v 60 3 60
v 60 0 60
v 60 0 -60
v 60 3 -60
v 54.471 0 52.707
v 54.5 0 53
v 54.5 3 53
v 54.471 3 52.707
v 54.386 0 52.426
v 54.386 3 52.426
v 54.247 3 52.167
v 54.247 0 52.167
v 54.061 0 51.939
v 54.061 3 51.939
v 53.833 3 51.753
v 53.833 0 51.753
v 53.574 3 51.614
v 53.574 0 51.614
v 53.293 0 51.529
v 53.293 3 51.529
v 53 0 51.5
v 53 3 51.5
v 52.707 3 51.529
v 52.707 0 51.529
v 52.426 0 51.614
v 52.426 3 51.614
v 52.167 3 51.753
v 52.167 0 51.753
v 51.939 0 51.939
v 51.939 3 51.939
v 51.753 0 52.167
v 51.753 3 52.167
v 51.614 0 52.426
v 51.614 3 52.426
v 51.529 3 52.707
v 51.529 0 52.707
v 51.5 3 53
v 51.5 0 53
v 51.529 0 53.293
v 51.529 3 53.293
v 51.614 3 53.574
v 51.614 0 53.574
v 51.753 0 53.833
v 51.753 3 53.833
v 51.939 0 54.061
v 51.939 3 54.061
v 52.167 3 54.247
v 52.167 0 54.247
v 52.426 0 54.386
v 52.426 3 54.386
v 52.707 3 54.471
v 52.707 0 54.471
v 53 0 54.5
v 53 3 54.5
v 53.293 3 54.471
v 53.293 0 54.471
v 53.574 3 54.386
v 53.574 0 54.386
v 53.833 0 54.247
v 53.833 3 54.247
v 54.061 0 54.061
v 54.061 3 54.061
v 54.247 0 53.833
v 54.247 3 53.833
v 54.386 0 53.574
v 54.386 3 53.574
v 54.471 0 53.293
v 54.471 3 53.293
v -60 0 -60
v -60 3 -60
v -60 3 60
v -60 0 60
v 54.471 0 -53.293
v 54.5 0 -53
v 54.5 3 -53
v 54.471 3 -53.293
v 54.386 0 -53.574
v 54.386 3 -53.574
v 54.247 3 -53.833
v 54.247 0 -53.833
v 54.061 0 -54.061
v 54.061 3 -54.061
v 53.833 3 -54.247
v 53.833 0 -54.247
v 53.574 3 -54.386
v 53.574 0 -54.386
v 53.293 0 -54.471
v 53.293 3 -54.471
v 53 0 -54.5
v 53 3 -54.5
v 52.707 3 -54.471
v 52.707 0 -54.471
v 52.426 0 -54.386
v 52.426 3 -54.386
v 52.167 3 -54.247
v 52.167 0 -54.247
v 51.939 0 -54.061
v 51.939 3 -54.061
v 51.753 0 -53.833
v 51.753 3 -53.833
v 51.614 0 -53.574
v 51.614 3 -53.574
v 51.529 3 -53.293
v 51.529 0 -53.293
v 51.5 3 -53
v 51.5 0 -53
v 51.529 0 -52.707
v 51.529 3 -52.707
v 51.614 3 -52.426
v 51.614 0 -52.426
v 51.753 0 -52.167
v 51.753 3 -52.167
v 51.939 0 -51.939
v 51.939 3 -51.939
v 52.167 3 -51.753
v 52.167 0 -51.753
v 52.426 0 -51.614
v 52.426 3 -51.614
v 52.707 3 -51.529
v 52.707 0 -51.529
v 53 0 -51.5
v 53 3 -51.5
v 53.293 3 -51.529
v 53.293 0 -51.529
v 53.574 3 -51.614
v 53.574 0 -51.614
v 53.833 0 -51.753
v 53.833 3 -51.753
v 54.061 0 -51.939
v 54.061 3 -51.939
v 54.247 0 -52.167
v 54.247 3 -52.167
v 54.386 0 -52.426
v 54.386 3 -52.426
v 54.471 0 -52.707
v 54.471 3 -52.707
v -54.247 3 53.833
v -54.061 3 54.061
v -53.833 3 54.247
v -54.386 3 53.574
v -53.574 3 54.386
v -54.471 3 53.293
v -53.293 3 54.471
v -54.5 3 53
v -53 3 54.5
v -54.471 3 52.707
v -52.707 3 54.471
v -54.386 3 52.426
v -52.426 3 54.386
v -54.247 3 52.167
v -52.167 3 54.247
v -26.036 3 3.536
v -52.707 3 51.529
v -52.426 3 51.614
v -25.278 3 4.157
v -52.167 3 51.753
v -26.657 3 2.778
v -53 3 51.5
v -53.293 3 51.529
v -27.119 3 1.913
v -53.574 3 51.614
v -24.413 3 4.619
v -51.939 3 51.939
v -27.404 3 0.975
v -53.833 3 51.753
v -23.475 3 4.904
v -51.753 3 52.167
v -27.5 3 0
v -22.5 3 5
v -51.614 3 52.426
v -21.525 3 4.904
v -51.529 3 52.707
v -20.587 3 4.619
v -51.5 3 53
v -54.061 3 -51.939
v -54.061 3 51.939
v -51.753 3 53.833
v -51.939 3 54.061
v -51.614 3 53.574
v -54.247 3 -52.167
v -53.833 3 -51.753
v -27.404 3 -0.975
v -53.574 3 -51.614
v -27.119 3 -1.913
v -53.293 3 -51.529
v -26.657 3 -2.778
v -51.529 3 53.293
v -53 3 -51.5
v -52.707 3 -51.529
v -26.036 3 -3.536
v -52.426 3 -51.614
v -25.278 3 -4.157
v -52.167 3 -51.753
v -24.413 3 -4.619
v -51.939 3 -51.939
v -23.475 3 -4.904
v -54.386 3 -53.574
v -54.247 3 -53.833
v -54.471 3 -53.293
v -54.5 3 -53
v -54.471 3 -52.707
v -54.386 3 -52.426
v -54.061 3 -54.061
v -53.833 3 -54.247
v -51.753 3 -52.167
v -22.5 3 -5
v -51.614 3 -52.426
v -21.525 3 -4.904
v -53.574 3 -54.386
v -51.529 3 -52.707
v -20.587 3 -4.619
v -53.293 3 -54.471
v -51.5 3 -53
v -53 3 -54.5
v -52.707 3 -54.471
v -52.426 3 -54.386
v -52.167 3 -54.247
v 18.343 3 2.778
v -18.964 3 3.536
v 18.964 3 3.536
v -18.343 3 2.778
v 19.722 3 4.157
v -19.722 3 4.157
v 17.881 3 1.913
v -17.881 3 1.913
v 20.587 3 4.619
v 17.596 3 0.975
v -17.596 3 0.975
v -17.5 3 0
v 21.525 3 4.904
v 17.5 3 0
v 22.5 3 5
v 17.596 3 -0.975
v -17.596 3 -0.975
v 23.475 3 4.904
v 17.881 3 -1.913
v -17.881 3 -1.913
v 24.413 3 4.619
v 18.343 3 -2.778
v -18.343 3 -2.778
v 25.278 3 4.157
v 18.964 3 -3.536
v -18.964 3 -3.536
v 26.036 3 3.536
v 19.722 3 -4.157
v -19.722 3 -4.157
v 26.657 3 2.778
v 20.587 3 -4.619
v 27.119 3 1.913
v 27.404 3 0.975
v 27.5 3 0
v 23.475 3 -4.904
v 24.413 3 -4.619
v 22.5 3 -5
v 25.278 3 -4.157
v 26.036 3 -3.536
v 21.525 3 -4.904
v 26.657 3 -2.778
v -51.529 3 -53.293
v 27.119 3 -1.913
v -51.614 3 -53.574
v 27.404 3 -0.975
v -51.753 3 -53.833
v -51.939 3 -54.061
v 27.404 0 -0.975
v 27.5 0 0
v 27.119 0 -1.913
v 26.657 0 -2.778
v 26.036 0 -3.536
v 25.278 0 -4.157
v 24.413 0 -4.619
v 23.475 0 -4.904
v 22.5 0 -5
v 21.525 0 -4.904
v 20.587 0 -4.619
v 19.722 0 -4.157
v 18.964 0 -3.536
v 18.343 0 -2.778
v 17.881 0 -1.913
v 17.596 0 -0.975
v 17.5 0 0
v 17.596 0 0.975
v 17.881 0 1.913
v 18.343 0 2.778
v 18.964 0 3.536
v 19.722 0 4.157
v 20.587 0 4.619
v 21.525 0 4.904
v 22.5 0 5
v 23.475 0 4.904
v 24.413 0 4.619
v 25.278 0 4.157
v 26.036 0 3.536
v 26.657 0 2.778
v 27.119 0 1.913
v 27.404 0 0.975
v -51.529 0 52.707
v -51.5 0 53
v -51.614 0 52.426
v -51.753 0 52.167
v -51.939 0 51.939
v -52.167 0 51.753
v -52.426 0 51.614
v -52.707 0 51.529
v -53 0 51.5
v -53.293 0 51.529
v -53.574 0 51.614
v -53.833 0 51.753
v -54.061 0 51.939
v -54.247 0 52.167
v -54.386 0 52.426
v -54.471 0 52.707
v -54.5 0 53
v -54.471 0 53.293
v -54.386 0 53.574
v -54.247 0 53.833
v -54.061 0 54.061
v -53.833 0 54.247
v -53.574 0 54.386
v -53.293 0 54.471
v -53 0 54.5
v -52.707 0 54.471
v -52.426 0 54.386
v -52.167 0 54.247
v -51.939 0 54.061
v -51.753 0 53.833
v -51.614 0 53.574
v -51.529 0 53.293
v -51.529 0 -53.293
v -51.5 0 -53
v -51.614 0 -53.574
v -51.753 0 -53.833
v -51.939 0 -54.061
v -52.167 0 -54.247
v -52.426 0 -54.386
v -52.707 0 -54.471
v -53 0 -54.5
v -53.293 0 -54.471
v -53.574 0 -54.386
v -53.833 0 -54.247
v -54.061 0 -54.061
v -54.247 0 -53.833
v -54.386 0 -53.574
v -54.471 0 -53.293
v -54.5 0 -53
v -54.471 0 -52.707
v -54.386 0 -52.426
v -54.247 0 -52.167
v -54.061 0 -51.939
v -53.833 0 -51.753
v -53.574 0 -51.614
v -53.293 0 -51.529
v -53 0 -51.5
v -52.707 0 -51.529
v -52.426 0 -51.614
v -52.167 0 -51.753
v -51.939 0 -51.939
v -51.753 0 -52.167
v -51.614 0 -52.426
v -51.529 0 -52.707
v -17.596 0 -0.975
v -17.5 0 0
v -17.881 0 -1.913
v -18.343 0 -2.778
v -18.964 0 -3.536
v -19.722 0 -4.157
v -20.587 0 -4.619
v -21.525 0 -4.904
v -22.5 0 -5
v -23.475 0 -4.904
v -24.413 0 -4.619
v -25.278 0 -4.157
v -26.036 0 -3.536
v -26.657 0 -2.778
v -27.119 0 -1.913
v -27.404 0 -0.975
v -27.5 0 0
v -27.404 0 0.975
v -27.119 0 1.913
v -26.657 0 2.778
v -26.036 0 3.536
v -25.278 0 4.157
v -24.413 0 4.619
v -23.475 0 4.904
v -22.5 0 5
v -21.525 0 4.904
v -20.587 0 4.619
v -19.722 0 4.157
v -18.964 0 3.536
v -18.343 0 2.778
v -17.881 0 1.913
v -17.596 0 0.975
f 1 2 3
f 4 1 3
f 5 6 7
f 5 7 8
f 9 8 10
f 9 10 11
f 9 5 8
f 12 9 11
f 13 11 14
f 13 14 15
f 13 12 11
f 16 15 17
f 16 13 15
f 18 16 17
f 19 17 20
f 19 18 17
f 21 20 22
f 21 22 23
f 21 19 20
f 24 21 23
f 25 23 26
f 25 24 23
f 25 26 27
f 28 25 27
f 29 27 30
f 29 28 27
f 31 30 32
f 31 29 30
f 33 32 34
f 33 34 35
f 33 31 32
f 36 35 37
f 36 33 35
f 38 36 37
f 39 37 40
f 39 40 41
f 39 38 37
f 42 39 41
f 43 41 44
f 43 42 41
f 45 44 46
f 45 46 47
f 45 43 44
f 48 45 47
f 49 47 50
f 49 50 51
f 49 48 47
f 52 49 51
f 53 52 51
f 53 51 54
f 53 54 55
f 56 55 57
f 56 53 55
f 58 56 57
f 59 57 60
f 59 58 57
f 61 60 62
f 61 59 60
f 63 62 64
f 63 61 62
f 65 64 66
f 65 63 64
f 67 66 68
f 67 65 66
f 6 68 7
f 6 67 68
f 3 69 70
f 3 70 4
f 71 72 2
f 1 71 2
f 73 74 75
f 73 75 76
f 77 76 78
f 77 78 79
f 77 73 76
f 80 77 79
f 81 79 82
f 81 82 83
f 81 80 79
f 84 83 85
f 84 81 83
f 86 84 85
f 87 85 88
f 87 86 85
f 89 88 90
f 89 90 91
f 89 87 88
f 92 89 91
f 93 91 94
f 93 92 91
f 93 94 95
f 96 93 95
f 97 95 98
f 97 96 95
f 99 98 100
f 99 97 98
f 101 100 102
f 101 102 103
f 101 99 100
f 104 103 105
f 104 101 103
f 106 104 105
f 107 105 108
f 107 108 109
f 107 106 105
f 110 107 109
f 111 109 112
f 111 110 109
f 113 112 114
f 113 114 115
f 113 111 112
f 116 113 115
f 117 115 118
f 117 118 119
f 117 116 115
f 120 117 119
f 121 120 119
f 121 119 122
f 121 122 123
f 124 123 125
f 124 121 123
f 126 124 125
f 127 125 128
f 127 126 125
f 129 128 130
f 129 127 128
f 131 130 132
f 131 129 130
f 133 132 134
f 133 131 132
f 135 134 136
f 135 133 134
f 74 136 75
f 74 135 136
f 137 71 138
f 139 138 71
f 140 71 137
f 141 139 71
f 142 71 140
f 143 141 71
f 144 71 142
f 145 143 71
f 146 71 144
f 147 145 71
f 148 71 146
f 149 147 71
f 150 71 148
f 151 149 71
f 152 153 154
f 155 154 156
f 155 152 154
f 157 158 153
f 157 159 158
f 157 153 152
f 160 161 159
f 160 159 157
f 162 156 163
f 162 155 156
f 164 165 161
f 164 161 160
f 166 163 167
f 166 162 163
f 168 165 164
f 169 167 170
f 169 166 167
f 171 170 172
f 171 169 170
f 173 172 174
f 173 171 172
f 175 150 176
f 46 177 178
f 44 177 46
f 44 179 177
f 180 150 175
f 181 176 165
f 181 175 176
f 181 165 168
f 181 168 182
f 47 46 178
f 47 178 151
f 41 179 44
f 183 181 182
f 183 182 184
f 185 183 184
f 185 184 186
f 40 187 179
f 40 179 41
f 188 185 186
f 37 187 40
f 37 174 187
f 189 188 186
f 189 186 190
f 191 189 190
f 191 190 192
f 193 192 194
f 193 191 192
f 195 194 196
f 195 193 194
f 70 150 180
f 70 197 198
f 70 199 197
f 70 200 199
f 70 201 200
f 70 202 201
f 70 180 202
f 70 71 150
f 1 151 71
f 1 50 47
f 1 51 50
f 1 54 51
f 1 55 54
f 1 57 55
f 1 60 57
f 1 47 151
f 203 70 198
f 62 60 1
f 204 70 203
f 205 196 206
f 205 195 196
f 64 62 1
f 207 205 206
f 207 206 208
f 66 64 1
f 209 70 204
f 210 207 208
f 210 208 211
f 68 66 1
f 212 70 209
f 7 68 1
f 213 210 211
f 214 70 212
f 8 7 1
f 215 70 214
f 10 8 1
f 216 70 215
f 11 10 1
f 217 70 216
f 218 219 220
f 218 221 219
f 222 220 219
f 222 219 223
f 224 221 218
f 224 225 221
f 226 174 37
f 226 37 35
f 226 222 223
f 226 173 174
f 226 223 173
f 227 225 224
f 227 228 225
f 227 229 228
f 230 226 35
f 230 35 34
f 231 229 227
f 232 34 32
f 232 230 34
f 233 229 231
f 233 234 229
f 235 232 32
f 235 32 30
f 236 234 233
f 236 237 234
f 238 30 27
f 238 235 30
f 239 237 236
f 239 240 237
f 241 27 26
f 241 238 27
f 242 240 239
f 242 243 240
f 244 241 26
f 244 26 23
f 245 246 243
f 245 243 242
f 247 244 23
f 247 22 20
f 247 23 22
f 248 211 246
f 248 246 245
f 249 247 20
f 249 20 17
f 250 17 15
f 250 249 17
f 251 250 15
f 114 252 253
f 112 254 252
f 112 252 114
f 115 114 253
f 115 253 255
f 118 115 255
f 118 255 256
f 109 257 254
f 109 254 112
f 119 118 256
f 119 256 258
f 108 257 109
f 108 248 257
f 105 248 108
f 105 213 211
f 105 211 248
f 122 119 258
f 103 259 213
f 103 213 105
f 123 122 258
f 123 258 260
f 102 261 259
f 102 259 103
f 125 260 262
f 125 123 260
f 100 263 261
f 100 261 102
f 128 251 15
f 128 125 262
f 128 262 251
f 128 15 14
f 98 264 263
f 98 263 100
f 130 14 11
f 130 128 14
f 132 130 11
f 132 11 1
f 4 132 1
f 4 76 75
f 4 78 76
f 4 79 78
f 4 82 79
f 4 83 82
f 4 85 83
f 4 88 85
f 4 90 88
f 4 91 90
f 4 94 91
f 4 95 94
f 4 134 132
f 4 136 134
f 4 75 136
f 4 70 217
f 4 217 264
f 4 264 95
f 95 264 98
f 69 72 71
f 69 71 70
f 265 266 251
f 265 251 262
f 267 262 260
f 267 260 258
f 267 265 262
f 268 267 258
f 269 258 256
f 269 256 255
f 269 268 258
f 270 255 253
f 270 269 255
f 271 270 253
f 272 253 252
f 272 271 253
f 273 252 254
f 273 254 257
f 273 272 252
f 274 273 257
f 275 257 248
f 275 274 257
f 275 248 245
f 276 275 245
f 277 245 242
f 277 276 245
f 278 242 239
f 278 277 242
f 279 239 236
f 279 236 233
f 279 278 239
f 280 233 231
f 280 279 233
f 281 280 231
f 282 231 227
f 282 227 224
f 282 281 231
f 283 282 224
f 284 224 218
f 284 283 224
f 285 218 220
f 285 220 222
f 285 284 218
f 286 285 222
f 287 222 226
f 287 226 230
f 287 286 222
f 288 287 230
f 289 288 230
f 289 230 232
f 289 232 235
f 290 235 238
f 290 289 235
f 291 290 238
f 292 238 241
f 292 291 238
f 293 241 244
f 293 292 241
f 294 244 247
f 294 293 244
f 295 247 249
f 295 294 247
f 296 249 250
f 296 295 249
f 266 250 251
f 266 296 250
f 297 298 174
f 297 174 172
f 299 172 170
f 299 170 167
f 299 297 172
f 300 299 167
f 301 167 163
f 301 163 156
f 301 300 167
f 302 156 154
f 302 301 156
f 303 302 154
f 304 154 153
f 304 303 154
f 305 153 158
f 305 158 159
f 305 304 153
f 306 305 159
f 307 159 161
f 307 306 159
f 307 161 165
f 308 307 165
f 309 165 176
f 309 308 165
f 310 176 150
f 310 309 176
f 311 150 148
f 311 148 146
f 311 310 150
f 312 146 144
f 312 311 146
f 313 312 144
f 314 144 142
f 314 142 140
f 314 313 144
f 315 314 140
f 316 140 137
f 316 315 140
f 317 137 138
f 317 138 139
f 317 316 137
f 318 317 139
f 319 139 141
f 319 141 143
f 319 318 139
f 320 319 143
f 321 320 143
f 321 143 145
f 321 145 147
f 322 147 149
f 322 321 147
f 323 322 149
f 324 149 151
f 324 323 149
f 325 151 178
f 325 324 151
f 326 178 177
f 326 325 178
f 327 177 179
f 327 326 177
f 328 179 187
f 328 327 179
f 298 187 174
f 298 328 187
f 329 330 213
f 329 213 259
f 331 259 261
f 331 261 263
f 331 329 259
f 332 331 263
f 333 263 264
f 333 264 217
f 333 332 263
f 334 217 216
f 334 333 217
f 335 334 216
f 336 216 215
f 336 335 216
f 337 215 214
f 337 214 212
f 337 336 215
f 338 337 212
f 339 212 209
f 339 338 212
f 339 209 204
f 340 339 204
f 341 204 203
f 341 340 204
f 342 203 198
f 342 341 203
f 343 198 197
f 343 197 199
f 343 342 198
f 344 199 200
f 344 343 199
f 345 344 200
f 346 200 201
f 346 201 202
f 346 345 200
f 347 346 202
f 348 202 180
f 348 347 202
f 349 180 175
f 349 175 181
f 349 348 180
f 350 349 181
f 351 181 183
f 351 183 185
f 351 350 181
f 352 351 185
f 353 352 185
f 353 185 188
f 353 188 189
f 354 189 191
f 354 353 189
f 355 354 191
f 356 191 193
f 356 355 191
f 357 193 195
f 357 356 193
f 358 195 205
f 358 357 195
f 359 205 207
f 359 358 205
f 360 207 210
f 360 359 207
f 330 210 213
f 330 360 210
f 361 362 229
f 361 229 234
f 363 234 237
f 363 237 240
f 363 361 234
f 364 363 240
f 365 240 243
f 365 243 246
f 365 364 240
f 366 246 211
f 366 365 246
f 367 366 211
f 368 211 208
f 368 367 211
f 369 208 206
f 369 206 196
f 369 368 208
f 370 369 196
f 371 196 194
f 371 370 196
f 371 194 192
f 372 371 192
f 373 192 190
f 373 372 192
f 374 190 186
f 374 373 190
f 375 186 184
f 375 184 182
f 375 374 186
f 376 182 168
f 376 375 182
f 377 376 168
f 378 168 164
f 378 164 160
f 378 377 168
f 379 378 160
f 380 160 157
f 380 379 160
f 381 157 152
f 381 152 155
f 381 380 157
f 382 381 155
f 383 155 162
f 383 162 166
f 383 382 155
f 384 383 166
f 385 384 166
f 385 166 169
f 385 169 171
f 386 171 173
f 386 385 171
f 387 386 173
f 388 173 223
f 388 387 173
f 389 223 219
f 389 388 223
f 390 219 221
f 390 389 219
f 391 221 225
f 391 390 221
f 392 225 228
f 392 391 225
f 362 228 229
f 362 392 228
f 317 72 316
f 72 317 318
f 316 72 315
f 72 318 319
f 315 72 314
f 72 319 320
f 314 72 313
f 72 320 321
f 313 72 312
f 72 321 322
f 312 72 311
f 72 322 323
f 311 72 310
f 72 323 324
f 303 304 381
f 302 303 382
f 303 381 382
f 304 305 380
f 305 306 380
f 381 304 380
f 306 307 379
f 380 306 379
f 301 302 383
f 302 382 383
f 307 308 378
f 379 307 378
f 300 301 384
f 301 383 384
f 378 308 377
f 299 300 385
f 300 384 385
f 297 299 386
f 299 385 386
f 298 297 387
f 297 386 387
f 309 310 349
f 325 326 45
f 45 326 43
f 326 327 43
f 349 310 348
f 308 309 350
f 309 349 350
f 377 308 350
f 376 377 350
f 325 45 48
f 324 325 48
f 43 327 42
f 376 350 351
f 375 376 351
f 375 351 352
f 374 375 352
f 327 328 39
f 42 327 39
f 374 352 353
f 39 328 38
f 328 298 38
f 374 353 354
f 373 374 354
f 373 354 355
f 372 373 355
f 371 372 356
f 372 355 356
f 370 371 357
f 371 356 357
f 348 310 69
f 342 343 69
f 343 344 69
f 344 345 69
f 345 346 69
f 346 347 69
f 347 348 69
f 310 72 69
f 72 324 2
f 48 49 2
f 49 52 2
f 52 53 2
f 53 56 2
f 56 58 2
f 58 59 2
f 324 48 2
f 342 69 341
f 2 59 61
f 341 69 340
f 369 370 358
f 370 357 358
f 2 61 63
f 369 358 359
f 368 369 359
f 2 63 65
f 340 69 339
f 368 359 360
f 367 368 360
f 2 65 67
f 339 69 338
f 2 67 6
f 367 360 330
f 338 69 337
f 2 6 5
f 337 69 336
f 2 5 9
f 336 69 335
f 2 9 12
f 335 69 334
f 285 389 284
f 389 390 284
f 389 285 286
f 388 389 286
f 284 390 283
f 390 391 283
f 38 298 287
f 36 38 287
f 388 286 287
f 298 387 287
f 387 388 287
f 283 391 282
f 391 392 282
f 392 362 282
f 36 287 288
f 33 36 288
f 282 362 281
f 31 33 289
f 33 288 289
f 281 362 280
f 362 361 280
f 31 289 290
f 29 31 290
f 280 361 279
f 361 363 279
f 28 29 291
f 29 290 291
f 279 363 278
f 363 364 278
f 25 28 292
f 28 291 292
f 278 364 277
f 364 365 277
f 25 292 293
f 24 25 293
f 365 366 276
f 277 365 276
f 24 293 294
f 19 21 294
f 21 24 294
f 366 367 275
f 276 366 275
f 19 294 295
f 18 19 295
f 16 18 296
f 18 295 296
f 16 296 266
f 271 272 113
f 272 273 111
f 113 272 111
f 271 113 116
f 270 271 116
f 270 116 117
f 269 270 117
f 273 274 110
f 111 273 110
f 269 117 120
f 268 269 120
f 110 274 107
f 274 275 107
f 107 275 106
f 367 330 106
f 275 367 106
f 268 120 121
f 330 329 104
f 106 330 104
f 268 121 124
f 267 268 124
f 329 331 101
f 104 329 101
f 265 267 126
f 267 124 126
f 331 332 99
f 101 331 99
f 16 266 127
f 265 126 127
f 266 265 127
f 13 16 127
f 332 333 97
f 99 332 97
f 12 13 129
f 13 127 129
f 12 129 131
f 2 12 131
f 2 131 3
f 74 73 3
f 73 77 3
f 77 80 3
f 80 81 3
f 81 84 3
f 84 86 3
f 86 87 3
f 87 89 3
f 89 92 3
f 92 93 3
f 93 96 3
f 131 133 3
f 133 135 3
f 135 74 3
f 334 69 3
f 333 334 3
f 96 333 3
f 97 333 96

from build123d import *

# Parameters (mm, degrees)
SKETCH1_W           = 120
SKETCH1_H           = 120
BOSS_EXTRUDE1_DEPTH = 3
SKETCH4_R           = 5
CUT_EXTRUDE2_DEPTH  = 3
SKETCH7_R           = 1.5
CUT_EXTRUDE3_DEPTH  = 3


with BuildPart() as part:
    # Sketch1 → Boss-Extrude1 (new body)
    with BuildSketch(Plane(origin=(0, 0, 0), x_dir=(1, 0, 0), z_dir=(0, 1, 0))):
        Rectangle(SKETCH1_W, SKETCH1_H)
    extrude(amount=BOSS_EXTRUDE1_DEPTH)

    # Sketch4 → Cut-Extrude2 (cut)
    with BuildSketch(Plane(origin=(0, 0, 0), x_dir=(1, 0, 0), z_dir=(0, 1, 0))):
        with Locations((-22.5, 0)):
            Circle(SKETCH4_R)
        with Locations((22.5, 0)):
            Circle(SKETCH4_R)
    extrude(amount=CUT_EXTRUDE2_DEPTH, mode=Mode.SUBTRACT)

    # Sketch7 → Cut-Extrude3 (cut)
    with BuildSketch(Plane(origin=(0, 0, 0), x_dir=(1, 0, 0), z_dir=(0, 1, 0))):
        with Locations((-53, 53)):
            Circle(SKETCH7_R)
        with Locations((53, 53)):
            Circle(SKETCH7_R)
        with Locations((-53, -53)):
            Circle(SKETCH7_R)
        with Locations((53, -53)):
            Circle(SKETCH7_R)
    extrude(amount=CUT_EXTRUDE3_DEPTH, mode=Mode.SUBTRACT)


solid = part.part
